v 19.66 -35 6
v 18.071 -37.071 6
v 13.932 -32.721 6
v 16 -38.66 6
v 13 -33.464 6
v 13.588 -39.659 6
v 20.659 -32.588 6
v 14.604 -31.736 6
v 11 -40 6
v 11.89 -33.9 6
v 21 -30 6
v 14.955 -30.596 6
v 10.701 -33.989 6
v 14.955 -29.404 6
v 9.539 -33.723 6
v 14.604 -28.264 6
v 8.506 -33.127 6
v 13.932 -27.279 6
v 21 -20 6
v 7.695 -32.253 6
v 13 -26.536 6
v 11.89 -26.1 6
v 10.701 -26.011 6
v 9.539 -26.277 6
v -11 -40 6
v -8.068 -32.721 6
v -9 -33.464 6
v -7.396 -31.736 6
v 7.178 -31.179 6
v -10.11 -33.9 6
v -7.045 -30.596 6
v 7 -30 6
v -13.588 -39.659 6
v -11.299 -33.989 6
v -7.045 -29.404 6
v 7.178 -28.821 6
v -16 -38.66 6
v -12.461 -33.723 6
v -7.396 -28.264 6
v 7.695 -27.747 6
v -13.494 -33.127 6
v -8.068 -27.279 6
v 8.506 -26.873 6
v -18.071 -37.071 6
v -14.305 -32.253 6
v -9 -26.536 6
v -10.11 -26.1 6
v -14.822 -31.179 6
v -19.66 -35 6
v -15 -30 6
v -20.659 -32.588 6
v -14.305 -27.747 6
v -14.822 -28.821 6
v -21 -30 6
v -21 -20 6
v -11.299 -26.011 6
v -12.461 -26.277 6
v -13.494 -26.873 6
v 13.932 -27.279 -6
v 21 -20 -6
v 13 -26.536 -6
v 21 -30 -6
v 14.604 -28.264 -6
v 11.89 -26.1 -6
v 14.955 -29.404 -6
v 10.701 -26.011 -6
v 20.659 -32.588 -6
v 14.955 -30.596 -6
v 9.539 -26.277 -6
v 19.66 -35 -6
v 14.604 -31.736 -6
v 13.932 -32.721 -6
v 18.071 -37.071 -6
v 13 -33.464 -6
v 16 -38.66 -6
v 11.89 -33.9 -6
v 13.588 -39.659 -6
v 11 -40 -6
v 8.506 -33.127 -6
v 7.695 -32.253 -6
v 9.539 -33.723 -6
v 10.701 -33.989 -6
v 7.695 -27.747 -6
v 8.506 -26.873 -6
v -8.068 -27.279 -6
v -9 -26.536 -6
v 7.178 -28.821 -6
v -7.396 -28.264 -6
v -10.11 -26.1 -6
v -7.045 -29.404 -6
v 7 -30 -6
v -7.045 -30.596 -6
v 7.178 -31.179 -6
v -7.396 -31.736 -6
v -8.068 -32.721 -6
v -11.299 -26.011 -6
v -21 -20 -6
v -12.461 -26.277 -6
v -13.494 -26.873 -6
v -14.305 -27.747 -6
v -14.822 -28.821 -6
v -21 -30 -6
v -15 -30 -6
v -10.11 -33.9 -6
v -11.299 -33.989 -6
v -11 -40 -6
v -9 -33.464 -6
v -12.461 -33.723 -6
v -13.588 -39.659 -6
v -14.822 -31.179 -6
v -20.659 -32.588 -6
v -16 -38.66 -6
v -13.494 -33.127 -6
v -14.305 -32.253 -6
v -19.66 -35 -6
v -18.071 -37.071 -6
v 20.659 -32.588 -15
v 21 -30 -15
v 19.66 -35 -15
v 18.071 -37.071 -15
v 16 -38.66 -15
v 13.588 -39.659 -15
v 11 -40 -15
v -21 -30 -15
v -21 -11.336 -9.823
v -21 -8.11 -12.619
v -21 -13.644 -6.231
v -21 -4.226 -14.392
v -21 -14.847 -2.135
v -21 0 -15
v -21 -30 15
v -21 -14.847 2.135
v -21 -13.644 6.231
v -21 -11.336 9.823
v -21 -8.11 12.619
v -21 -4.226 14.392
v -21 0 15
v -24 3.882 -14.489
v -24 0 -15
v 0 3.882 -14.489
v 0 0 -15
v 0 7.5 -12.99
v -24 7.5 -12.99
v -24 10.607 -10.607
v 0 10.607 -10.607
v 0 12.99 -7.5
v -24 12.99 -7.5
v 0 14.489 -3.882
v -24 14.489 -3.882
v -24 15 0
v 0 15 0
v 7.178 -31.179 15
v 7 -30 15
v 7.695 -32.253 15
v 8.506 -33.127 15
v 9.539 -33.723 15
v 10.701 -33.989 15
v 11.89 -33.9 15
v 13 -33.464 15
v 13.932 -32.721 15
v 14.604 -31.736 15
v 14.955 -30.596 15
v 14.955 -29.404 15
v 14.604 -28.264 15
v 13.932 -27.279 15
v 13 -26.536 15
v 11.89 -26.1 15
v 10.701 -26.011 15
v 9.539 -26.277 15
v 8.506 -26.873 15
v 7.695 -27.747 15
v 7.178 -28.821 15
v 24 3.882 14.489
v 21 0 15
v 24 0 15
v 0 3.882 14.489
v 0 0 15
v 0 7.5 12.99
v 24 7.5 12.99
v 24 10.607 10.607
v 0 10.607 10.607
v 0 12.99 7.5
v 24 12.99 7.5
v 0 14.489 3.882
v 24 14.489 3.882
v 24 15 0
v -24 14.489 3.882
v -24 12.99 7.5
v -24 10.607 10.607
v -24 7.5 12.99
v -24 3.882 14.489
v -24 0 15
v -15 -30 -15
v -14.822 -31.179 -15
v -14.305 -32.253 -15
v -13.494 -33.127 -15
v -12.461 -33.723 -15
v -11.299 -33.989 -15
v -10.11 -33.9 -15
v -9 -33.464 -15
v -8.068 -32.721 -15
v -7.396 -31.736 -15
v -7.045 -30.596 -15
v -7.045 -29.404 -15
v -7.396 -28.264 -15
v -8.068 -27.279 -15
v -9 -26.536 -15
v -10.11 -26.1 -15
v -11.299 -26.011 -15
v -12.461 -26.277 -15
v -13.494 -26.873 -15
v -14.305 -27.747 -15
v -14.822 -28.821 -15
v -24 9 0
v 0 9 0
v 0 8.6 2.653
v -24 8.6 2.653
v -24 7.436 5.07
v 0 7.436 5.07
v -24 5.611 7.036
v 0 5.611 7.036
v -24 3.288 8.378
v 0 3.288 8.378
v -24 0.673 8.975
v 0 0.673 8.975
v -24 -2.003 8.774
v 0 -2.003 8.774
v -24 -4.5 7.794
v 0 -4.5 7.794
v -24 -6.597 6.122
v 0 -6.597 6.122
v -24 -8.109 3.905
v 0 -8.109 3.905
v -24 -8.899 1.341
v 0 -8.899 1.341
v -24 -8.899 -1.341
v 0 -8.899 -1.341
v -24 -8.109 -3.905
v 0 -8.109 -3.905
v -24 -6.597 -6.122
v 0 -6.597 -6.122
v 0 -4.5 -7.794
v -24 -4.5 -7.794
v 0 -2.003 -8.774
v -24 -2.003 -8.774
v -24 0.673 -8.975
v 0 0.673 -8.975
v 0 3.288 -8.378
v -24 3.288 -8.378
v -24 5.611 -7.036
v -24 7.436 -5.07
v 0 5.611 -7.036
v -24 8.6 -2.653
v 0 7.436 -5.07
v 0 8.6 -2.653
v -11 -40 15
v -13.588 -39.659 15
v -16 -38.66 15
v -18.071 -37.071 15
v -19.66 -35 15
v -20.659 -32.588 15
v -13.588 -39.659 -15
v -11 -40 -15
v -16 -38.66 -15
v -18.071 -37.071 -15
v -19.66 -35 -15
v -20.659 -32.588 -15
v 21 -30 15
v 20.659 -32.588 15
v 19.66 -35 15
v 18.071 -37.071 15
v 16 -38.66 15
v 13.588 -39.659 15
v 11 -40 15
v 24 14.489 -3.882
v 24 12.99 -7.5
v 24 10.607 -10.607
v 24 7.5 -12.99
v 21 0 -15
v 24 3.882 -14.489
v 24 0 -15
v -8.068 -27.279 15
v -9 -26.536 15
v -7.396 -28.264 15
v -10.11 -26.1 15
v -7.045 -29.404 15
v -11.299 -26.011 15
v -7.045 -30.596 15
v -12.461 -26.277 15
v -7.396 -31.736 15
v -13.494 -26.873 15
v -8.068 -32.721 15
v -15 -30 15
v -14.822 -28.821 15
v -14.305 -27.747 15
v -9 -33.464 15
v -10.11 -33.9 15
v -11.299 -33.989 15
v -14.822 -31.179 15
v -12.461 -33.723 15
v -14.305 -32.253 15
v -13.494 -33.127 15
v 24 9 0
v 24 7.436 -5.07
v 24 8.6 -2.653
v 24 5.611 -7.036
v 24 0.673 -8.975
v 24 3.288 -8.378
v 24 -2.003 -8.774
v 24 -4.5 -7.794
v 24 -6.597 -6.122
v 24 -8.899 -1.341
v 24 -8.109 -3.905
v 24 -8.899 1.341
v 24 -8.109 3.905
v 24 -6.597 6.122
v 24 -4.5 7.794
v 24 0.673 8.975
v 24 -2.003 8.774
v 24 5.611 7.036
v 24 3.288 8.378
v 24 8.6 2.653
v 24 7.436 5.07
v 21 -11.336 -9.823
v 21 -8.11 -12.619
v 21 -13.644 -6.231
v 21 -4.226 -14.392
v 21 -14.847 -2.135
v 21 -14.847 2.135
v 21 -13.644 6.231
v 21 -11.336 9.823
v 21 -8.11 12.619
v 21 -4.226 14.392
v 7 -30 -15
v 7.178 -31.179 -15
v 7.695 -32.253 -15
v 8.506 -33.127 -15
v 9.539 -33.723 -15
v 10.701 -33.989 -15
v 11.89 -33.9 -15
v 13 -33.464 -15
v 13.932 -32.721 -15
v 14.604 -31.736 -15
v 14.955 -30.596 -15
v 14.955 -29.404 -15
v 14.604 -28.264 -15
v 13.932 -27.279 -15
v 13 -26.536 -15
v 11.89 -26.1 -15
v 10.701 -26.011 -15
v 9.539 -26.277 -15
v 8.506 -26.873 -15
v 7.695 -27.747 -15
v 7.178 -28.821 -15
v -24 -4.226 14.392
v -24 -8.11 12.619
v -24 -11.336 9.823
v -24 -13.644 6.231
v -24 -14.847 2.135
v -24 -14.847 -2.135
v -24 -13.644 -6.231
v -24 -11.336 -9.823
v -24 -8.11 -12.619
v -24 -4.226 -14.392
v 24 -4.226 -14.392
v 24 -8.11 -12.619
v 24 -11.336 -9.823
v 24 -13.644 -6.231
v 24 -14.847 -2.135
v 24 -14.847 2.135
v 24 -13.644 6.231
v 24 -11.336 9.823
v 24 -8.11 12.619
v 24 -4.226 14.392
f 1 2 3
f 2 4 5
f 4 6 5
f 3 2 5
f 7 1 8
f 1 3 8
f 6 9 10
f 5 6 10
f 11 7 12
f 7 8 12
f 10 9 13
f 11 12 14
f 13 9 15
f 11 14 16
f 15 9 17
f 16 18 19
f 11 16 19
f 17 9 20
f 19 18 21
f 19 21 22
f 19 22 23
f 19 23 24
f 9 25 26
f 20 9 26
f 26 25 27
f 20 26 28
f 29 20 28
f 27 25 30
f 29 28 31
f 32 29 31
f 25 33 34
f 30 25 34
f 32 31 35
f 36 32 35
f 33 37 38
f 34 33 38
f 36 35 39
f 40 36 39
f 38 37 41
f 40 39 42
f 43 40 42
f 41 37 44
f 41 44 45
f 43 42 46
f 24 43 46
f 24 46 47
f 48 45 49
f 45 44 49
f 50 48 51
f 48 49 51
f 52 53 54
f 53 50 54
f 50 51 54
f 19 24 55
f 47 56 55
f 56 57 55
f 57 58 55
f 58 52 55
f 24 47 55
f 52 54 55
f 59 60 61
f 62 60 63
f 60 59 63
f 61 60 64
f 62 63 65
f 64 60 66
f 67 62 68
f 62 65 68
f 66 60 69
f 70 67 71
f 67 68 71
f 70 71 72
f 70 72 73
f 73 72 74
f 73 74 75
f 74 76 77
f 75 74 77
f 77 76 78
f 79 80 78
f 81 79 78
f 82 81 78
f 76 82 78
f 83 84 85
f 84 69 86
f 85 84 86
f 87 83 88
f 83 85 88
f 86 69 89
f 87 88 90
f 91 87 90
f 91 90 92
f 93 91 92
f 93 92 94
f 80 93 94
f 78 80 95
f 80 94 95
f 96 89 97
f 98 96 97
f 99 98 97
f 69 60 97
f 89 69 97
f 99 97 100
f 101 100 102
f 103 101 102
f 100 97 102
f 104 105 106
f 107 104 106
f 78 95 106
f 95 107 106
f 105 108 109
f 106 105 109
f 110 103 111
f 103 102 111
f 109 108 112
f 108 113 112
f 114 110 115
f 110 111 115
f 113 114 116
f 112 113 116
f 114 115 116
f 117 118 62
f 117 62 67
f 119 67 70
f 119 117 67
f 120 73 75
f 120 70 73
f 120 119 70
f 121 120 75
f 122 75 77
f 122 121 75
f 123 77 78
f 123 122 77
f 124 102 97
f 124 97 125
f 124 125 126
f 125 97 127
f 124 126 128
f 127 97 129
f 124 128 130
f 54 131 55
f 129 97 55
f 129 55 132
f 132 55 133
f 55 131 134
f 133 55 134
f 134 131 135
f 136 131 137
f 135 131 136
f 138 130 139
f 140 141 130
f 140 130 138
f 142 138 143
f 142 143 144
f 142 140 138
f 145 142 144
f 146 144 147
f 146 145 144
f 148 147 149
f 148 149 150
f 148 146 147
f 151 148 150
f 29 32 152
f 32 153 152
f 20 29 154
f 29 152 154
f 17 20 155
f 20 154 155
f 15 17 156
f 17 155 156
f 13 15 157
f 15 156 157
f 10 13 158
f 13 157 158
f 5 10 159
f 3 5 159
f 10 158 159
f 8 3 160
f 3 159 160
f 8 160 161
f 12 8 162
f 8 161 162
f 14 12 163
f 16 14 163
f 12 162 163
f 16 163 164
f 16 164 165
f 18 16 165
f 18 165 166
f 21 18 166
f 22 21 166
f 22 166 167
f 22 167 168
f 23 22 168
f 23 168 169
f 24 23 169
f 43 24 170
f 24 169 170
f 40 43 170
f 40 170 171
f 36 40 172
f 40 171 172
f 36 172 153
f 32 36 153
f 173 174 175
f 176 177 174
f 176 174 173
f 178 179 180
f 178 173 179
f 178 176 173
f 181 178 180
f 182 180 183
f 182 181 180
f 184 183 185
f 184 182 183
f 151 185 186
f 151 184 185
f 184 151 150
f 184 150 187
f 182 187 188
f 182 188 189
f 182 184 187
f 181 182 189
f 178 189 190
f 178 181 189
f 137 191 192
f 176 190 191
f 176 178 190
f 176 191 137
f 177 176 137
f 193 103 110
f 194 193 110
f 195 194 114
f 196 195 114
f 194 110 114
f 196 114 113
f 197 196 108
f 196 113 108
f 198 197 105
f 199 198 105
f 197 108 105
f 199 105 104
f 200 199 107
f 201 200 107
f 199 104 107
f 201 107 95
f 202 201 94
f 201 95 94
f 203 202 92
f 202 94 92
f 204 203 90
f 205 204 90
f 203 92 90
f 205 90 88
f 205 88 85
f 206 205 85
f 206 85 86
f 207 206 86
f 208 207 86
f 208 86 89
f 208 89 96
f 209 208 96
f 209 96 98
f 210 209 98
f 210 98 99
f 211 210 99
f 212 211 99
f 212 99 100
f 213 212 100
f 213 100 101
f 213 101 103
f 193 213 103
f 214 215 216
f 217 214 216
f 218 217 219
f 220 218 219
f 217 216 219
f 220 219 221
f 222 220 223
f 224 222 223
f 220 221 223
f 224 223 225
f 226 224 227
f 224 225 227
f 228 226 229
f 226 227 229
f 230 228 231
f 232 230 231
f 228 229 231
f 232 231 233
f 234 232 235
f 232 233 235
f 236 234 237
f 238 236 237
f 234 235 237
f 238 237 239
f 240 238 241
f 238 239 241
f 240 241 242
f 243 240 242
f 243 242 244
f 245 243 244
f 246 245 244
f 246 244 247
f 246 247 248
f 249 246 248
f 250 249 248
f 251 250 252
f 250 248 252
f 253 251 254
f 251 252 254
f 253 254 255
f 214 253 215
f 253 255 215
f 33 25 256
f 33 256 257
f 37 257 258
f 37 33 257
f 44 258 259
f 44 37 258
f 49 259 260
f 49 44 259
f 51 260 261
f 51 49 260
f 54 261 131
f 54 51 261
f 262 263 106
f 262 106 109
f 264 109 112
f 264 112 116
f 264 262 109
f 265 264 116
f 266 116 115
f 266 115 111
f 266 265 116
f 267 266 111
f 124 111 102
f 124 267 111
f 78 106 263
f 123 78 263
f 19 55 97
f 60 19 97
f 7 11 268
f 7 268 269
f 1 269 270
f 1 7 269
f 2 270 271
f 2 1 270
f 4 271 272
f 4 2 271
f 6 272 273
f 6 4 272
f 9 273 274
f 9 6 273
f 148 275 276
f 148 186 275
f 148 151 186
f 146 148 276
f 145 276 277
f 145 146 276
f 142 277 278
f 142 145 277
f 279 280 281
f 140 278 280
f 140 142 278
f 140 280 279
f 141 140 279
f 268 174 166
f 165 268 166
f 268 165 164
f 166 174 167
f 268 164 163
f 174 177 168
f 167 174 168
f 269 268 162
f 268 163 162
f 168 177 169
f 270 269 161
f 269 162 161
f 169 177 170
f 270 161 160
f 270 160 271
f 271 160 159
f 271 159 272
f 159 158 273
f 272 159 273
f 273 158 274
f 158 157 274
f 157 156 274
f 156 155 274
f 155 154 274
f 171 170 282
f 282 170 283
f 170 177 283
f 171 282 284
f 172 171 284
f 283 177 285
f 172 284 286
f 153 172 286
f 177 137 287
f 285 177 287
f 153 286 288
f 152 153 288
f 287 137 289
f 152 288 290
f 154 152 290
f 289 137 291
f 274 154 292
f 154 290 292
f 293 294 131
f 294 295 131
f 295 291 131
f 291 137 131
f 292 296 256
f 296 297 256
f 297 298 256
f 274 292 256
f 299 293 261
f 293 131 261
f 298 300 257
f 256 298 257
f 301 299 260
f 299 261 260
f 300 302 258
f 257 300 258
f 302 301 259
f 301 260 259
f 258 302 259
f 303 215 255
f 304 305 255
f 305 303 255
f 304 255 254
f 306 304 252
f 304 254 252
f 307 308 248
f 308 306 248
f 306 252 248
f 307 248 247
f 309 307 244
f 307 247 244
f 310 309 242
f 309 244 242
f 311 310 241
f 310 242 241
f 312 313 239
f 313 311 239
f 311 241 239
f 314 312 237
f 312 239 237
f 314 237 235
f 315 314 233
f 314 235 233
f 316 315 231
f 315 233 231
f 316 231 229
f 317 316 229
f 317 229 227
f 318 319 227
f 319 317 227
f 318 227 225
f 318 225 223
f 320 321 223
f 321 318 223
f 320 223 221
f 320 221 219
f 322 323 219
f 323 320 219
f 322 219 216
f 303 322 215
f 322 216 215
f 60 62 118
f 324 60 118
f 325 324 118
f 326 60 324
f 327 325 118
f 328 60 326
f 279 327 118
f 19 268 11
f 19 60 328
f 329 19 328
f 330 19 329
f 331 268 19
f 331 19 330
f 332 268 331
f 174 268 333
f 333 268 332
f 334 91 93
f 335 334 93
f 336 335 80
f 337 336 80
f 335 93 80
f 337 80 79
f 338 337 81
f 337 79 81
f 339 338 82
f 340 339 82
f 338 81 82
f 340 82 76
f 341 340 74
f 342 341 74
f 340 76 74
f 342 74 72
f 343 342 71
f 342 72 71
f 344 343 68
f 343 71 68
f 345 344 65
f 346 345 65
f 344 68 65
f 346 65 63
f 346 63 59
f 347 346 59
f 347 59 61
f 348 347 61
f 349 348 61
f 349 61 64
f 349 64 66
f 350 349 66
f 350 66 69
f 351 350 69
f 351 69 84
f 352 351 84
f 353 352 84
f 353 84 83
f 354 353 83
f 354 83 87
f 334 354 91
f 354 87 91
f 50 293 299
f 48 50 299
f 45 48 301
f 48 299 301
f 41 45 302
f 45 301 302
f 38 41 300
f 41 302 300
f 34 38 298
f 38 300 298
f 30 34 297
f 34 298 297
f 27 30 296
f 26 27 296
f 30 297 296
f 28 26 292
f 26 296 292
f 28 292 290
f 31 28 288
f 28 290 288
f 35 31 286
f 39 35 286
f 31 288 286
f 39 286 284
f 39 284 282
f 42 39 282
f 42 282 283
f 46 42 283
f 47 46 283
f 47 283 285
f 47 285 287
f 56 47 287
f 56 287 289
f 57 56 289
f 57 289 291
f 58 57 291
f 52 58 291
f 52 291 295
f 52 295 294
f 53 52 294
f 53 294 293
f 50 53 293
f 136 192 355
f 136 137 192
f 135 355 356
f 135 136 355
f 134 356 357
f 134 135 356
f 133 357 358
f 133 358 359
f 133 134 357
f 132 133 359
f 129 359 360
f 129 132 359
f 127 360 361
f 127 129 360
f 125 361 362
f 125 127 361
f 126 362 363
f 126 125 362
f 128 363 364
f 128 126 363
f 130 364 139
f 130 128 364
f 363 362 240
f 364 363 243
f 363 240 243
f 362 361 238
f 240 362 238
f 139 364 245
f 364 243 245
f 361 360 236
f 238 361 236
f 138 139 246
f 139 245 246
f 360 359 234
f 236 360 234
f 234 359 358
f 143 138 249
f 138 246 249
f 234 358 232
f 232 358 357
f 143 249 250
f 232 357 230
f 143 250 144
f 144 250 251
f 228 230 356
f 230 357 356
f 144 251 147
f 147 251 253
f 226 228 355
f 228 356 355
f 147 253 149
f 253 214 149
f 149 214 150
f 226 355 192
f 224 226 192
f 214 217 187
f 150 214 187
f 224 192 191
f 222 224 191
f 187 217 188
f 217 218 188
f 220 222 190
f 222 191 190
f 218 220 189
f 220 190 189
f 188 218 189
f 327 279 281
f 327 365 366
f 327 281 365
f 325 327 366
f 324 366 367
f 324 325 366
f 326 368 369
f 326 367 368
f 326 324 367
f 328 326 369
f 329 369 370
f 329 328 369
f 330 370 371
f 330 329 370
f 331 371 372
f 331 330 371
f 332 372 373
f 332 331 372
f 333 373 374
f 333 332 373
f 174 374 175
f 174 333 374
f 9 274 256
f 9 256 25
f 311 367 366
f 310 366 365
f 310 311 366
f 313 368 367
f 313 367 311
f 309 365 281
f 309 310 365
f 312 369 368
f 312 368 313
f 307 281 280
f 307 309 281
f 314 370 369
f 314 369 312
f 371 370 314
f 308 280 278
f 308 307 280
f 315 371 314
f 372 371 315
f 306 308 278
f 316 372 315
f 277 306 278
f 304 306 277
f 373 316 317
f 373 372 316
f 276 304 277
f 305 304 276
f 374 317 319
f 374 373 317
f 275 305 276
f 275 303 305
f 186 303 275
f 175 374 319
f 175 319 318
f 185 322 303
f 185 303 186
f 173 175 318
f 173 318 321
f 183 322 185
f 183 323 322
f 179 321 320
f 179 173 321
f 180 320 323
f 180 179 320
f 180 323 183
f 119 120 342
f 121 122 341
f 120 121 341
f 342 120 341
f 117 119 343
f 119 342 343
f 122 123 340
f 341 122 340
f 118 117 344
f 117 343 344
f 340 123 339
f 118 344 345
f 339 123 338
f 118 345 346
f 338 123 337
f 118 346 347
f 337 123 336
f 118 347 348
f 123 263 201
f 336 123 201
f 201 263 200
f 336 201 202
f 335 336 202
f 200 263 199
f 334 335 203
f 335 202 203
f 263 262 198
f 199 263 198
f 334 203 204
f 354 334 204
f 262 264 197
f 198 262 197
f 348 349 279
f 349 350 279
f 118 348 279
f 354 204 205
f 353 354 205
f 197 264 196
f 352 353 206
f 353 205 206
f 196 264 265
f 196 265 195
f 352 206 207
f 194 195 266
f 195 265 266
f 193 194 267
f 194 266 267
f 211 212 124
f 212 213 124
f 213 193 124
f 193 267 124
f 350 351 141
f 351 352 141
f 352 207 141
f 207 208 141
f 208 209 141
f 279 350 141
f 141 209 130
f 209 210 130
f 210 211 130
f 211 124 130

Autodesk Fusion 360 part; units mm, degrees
sketch "草图1" plane through (0, 0, 0) normal (1, 0, 0) x (0, 1, 0)
  circle A0 centre (0, 0) radius 15
  circle A1 centre (0, 0) radius 9
  line L0 (0, 15) -> (-40, 15)
  line L1 (-40, 15) -> (-40, 6)
  line L2 (-40, 6) -> (-20, 6)
  line L3 (-20, 6) -> (-20, -6)
  line L4 (-20, -6) -> (-40, -6)
  line L5 (-40, -6) -> (-40, -15)
  line L6 (-40, -15) -> (0, -15)
  line L7 (-157.7005, 0) -> (55, 0) construction
  dimension "d1" = 30
  dimension "d2" = 18
  dimension "d3" = 12
  dimension "d4" = 20
  dimension "d5" = 40
extrude "拉伸1" add sketch "草图1" along normal mid plane 48 contours A0
extrude "拉伸2" add sketch "草图1" along normal mid plane 42 contours A0 L0 L1 L2 L3 L4 L5 L6
fillet "圆角1" radius 10 4 edges at (21, -40, 10.5) (21, -40, -10.5) (-21, -40, 10.5) (-21, -40, -10.5)
sketch "草图2" plane through (0, 0, 15) normal (0, 0, 1) x (-1, 0, 0)
  arc A0 (21, 30) -> (11, 40) centre (11, 30) ccw
  line L0 (11, 40) -> (-11, 40)
  arc A1 (-11, 40) -> (-21, 30) centre (-11, 30) ccw
  line L1 (-21, 30) -> (-21, 0)
  line L2 (-21, 0) -> (21, 0)
  line L3 (21, 0) -> (21, 30)
  line L4 (21, 30) -> (-21, 30)
  circle A2 centre (11, 30) radius 4
  circle A3 centre (-11, 30) radius 4
  line L5 (0, 0) -> (0, 40)
  line L6 (-11, 30) -> (-11, 40)
  dimension "d12" = 8
extrude "拉伸3" cut sketch "草图2" against normal through all contours L4 A2 | L4 A2 | L4 A3 L6 | L4 A3 L6 | L4 A3
